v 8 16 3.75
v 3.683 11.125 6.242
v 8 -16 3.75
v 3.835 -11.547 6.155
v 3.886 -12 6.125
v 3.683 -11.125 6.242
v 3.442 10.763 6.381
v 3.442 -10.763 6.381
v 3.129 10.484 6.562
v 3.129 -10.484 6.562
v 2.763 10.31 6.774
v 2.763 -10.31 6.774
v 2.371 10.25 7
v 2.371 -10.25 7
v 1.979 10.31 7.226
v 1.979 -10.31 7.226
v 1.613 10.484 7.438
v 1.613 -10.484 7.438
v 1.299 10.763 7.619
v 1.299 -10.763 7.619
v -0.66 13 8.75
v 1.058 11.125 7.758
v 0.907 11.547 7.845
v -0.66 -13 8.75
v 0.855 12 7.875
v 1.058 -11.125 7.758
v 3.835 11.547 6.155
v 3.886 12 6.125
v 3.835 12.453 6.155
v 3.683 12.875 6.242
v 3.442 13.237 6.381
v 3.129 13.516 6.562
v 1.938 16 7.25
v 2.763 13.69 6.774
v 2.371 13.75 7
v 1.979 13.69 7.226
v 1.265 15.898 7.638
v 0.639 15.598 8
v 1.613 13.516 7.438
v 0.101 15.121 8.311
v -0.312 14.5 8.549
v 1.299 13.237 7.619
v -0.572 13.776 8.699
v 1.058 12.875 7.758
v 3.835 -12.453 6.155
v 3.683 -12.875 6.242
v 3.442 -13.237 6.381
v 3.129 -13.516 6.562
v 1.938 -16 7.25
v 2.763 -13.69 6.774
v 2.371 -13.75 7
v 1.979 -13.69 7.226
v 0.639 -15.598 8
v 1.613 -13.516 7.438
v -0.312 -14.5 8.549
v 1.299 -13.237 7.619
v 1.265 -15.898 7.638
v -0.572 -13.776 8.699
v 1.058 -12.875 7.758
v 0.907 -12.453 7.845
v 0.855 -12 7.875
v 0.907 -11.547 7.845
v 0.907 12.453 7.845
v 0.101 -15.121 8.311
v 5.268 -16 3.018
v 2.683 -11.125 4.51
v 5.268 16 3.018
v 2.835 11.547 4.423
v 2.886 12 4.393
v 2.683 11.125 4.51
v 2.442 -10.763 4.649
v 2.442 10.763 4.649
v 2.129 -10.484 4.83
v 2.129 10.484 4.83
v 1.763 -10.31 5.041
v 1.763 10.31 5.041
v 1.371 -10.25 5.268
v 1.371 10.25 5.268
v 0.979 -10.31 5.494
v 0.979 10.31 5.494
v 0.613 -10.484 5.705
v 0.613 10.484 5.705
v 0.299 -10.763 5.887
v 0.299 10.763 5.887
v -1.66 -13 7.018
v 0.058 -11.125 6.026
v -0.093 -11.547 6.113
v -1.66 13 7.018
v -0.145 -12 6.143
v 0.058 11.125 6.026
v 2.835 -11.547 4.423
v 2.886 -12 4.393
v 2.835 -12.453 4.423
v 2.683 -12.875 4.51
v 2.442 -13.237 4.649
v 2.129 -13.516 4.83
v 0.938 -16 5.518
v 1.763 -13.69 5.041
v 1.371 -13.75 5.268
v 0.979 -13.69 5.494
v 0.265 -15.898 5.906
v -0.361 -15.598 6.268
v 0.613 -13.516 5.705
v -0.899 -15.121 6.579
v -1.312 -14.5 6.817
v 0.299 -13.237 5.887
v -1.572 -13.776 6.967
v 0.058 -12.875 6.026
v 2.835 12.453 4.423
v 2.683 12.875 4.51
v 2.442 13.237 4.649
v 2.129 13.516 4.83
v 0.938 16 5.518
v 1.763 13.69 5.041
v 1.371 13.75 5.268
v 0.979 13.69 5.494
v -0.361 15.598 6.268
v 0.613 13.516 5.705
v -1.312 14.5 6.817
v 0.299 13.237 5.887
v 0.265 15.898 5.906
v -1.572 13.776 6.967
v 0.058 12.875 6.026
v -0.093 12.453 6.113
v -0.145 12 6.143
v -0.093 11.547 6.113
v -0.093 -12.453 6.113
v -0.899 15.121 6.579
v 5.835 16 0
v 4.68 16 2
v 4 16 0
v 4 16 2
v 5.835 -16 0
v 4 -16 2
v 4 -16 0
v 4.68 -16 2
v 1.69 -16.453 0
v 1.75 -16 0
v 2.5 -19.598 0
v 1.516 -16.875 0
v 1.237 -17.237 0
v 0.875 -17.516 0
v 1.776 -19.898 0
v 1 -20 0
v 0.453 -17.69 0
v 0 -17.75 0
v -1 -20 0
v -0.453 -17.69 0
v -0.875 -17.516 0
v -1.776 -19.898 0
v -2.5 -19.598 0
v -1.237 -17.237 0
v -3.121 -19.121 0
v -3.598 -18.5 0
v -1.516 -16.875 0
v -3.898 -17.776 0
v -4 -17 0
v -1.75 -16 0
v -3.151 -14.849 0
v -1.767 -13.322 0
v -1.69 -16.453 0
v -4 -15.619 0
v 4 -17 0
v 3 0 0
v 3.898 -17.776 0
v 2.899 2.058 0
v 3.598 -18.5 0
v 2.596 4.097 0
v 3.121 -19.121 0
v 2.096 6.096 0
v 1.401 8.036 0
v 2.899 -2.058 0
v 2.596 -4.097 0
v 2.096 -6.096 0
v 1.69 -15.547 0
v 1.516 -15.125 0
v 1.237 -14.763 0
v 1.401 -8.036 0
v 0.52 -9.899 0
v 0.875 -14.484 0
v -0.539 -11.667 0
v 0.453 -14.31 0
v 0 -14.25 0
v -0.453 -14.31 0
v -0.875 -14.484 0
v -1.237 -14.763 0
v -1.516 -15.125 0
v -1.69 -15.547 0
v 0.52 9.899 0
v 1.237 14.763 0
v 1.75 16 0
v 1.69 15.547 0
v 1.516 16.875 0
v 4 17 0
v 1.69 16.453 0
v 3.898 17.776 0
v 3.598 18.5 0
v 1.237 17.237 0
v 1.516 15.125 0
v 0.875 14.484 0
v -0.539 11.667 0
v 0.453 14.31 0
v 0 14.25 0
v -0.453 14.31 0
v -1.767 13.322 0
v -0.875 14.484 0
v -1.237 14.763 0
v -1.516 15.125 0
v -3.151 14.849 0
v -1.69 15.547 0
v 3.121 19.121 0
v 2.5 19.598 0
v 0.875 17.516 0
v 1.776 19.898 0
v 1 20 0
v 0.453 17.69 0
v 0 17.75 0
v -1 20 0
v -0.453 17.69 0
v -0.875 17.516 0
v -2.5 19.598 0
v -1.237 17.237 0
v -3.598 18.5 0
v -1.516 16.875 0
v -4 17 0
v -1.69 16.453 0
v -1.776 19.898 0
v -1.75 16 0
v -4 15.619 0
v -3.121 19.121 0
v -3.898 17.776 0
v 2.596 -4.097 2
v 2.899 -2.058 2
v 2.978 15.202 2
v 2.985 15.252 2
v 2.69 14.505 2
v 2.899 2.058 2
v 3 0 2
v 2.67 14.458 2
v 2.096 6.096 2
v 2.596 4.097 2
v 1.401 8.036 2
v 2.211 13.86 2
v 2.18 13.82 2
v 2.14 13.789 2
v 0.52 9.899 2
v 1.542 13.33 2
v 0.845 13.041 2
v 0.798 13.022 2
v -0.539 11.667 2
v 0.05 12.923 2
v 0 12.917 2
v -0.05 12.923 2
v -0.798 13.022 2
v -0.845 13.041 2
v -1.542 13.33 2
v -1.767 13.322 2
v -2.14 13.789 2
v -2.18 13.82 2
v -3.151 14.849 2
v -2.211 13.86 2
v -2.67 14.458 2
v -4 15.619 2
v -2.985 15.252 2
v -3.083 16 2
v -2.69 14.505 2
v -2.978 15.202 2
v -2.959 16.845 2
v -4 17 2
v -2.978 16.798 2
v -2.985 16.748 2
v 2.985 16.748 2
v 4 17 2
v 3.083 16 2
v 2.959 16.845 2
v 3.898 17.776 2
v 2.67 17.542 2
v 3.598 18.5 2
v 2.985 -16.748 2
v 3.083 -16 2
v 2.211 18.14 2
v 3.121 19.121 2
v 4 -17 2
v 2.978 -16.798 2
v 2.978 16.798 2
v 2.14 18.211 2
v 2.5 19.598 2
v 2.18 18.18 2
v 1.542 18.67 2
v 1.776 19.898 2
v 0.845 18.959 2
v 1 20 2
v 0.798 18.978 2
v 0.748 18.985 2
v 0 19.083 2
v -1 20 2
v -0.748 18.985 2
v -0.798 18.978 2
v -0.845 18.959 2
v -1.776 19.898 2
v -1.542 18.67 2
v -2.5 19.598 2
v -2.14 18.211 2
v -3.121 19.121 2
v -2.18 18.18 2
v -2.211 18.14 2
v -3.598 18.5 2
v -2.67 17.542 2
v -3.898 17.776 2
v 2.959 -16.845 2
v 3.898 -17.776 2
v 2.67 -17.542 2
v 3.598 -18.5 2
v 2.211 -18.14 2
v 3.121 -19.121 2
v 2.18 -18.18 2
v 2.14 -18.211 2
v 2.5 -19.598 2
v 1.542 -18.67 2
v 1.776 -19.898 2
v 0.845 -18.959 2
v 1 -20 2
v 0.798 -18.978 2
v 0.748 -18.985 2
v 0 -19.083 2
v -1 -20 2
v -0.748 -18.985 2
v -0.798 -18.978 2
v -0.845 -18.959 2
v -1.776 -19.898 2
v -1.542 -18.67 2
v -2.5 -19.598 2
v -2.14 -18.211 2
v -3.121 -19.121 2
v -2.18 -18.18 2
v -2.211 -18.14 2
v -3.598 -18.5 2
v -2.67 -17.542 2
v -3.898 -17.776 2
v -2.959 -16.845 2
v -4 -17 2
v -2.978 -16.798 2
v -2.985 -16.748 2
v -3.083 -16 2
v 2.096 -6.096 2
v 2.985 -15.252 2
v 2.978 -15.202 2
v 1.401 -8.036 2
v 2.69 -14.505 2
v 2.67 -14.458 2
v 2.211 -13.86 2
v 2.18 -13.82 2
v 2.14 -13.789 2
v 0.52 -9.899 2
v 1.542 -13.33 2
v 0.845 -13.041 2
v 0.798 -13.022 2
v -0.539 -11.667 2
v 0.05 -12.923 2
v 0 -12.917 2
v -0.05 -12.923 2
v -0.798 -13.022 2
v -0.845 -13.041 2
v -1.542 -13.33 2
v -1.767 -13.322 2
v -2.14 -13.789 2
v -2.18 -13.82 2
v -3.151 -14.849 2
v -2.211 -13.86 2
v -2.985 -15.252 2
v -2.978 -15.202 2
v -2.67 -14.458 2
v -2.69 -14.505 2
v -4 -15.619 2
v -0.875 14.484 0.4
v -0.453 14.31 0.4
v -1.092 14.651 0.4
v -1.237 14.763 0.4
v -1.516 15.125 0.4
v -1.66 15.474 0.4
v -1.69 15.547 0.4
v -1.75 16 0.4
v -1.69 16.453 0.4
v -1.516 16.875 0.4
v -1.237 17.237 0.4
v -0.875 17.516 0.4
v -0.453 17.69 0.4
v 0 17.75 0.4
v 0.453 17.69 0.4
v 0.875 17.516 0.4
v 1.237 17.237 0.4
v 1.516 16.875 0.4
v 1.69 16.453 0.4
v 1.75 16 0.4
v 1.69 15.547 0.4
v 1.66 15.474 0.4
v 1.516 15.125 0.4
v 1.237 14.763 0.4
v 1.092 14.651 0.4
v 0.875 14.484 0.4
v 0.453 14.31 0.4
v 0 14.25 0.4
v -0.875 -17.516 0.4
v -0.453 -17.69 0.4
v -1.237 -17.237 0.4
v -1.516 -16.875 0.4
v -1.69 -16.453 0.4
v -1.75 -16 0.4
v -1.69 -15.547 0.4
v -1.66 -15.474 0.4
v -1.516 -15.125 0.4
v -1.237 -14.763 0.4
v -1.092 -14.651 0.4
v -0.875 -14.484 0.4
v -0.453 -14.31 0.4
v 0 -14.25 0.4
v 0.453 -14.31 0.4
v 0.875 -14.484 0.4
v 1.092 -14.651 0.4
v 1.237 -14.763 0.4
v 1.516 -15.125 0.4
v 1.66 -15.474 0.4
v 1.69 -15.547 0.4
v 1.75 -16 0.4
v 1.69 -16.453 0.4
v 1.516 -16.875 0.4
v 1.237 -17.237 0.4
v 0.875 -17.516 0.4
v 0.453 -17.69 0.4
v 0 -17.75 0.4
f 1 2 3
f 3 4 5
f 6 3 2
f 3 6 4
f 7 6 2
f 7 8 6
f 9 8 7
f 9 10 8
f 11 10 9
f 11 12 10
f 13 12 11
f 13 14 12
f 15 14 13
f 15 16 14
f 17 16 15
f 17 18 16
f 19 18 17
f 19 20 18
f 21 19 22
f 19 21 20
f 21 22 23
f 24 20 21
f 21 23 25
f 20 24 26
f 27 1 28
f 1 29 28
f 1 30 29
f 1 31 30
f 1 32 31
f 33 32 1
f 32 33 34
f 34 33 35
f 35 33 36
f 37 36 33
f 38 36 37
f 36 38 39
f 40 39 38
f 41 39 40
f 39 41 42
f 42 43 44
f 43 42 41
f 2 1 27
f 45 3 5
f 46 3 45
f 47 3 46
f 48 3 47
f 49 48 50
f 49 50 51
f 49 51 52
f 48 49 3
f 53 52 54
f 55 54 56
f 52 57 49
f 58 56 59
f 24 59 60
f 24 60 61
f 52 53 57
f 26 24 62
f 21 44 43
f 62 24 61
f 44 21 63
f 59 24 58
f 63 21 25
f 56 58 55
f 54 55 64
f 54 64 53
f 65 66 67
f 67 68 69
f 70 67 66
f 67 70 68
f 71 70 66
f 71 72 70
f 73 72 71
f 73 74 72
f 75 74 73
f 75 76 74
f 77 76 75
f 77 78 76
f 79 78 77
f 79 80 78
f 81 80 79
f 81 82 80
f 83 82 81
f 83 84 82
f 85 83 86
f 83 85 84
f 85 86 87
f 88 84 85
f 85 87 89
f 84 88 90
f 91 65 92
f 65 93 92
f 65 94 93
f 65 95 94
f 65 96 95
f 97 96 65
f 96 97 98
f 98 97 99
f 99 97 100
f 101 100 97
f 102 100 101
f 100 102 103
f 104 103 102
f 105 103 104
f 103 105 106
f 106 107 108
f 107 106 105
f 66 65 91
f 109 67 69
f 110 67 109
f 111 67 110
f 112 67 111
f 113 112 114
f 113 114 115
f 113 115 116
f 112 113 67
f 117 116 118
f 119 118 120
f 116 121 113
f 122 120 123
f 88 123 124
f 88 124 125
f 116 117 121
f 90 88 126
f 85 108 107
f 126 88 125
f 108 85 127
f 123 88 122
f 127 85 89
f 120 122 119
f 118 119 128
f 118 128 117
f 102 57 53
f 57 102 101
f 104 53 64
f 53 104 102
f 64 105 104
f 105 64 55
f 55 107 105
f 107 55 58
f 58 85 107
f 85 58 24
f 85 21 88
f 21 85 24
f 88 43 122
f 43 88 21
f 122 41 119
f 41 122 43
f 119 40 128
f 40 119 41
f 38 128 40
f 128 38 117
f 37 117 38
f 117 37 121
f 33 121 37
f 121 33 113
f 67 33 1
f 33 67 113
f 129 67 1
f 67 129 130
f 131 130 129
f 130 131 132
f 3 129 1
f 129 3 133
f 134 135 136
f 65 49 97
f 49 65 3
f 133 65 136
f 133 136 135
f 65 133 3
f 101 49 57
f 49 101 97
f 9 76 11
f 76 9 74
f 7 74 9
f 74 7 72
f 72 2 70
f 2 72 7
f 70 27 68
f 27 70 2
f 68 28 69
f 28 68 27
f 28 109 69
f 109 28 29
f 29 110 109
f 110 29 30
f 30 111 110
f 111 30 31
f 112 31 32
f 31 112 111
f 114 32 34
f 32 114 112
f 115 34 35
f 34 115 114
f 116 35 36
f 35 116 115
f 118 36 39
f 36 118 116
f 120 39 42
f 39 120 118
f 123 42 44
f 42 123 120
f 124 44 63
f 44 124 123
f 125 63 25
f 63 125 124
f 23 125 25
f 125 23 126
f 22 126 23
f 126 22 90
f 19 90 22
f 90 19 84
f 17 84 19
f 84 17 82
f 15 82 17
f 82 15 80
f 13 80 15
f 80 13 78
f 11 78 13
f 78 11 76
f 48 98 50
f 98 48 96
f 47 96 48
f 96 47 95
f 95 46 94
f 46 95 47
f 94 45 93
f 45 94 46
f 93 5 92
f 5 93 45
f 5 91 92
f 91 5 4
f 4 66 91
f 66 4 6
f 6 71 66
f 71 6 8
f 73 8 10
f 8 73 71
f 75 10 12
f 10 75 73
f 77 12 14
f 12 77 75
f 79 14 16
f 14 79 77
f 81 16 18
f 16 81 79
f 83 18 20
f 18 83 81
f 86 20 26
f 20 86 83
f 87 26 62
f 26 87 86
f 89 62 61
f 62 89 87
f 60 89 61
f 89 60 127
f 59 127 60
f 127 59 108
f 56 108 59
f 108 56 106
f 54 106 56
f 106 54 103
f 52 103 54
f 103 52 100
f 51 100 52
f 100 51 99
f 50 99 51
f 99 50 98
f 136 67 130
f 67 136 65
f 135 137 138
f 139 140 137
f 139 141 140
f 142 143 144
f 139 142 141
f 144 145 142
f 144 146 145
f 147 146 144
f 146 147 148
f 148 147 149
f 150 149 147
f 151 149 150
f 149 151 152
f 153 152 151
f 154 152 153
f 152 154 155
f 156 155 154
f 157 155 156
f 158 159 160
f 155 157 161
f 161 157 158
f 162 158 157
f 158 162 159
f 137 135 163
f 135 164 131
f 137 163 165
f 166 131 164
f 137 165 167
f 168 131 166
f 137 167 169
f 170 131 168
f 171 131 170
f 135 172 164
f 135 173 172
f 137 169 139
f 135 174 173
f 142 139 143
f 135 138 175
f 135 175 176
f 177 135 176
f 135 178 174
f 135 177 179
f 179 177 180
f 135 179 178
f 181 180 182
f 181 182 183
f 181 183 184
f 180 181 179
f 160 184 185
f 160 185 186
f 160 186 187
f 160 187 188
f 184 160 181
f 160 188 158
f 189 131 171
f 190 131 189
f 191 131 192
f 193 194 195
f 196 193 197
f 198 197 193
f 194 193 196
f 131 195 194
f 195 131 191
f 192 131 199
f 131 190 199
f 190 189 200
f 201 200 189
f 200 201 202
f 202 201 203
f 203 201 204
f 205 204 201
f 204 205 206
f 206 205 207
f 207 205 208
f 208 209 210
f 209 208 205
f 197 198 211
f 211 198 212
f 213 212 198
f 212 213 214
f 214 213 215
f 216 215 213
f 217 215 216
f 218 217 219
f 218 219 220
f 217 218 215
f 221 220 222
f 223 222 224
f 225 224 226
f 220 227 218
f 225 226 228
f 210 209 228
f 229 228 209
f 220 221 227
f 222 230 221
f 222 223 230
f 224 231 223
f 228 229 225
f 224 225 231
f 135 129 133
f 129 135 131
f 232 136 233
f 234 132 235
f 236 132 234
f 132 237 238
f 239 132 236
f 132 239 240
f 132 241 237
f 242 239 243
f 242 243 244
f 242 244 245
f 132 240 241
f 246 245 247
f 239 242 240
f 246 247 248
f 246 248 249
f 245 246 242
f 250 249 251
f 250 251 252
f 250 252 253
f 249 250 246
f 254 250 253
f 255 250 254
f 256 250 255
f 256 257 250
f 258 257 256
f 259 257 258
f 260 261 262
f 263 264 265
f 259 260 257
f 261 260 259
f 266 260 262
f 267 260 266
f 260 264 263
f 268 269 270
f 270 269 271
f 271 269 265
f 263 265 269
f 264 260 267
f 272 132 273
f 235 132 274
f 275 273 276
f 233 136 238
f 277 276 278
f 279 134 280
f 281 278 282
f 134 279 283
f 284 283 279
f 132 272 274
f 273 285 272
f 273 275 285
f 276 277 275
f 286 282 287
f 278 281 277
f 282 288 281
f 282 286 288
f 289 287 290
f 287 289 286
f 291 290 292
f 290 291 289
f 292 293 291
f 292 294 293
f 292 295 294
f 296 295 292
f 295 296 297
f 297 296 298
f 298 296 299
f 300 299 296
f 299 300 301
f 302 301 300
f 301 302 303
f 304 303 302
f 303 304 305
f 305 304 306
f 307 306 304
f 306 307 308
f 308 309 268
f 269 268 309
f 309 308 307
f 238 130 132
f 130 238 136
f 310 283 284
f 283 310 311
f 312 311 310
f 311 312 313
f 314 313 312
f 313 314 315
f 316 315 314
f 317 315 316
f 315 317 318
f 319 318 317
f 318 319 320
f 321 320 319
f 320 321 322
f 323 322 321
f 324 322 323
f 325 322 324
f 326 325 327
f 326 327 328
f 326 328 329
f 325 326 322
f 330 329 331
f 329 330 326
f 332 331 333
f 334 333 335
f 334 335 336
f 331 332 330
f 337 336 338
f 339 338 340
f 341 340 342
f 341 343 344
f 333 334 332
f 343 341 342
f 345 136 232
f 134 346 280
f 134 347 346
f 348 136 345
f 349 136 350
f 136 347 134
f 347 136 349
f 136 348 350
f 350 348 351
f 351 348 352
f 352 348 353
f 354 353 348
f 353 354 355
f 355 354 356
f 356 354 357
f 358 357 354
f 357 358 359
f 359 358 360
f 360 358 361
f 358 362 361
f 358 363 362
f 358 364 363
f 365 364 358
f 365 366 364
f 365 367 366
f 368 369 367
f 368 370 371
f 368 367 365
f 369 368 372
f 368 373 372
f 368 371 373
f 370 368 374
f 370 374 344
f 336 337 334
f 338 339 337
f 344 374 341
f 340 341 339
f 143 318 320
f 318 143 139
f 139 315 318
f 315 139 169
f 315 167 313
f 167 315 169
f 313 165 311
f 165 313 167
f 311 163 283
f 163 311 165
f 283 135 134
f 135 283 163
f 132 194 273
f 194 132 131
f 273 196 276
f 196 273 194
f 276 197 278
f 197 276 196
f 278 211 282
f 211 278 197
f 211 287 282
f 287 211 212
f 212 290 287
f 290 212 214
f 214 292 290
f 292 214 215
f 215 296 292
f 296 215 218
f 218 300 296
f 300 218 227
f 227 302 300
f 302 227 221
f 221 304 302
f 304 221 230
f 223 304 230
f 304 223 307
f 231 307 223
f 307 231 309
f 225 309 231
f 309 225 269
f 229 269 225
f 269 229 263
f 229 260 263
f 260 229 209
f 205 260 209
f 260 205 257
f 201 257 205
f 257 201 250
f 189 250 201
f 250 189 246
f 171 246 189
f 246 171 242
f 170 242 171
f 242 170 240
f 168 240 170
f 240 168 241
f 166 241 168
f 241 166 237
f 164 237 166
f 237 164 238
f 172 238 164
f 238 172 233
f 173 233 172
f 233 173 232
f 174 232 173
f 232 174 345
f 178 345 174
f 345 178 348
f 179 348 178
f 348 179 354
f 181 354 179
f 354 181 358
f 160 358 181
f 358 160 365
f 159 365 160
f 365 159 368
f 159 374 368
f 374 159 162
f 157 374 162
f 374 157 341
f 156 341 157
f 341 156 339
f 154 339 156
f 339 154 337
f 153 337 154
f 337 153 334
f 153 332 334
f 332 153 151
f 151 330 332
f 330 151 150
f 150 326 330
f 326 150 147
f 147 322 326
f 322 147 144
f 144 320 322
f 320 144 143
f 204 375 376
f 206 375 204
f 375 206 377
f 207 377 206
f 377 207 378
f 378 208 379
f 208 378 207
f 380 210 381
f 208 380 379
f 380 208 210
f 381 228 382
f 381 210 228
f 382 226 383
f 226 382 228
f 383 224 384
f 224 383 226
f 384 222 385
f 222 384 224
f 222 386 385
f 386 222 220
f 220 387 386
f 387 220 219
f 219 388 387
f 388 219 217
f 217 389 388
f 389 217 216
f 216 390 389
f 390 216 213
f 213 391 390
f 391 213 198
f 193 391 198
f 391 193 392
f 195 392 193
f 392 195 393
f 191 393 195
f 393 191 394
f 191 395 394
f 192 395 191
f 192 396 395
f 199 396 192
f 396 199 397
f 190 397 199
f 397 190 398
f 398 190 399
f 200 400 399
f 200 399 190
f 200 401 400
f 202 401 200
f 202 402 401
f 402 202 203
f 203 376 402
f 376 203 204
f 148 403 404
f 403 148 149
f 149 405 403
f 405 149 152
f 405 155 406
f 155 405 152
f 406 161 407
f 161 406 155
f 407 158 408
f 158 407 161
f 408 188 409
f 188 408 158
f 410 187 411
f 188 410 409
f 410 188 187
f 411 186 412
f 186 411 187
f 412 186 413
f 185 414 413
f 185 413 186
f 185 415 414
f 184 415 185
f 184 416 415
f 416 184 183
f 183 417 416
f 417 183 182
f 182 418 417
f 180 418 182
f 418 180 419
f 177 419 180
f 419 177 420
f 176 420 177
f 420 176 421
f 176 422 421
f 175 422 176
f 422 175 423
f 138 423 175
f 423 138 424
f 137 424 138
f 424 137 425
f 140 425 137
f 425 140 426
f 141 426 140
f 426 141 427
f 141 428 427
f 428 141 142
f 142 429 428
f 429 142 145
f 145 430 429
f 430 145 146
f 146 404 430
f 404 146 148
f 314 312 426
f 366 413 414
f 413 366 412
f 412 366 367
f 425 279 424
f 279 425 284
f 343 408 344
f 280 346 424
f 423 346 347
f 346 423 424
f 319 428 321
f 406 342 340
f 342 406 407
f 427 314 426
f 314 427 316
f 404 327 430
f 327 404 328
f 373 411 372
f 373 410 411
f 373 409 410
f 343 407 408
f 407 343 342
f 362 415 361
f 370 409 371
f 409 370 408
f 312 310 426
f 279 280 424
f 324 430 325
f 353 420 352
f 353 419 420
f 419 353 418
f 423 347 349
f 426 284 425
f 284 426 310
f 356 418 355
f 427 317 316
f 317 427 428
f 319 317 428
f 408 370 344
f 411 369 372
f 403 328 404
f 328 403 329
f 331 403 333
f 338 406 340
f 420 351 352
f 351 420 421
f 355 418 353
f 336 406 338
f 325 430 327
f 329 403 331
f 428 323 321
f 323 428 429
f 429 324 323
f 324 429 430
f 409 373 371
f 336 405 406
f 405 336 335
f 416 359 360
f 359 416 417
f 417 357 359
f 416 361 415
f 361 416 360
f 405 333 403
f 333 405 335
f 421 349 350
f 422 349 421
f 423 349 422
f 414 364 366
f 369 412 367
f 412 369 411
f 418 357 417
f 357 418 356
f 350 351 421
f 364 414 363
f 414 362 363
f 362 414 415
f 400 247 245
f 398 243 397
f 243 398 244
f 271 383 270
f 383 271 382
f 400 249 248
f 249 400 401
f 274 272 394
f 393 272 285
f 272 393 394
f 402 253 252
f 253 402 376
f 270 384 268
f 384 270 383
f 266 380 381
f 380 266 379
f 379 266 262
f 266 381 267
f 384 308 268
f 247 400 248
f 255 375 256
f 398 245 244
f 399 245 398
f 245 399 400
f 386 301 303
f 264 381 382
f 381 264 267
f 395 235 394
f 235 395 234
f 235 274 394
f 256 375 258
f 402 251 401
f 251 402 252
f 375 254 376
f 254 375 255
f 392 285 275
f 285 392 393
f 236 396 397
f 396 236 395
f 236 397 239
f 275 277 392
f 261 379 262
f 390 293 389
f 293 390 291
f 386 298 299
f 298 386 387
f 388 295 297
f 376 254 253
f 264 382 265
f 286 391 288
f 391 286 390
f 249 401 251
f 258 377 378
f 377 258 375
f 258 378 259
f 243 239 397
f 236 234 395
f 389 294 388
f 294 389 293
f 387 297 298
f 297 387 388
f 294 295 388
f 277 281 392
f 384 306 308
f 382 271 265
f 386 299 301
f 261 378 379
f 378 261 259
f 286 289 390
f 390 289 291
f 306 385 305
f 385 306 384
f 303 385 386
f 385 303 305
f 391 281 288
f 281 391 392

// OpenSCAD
fan_mount();

module fan_mount() difference() {
	union() {
	linear_extrude(height=2,convexity=30) difference() {
		translate([0,0]) minkowski() {
			square([8-6,40-6],center=true);
			circle(r=3,$fn=24);
		}
		translate([-38/2+1,0,0]) circle(r=42/2,$fn=64);
		for(y=[-16,16])
			translate([0,y]) circle(r=3.5/2,$fn=24);

	}
	translate([8,0,3.75]) rotate([0,210,0]) union() {
	linear_extrude(height=2,convexity=30) difference() {
		translate([3,0]) minkowski() {
			square([14-6,32-6],center=true);
			circle(r=3,$fn=24);
		} 
		translate([-8,-16]) square([8,34]);
		for(y=[-12,12])
			translate([6.5,y]) circle(r=3.5/2,$fn=24);

	}
	translate([0,-32/2,0]) cube([2,32,5]);
	}
	translate([4,0]) linear_extrude(height=2) square([2,32],center=true);
	}
	for(y=[-16,16]) translate([0,y,0.4]) cylinder(r1=3.5/2,r2=6.5/2,h=1.8,$fn=24);
	translate([4,-36/2,-4]) cube([8,36,4]);
}
